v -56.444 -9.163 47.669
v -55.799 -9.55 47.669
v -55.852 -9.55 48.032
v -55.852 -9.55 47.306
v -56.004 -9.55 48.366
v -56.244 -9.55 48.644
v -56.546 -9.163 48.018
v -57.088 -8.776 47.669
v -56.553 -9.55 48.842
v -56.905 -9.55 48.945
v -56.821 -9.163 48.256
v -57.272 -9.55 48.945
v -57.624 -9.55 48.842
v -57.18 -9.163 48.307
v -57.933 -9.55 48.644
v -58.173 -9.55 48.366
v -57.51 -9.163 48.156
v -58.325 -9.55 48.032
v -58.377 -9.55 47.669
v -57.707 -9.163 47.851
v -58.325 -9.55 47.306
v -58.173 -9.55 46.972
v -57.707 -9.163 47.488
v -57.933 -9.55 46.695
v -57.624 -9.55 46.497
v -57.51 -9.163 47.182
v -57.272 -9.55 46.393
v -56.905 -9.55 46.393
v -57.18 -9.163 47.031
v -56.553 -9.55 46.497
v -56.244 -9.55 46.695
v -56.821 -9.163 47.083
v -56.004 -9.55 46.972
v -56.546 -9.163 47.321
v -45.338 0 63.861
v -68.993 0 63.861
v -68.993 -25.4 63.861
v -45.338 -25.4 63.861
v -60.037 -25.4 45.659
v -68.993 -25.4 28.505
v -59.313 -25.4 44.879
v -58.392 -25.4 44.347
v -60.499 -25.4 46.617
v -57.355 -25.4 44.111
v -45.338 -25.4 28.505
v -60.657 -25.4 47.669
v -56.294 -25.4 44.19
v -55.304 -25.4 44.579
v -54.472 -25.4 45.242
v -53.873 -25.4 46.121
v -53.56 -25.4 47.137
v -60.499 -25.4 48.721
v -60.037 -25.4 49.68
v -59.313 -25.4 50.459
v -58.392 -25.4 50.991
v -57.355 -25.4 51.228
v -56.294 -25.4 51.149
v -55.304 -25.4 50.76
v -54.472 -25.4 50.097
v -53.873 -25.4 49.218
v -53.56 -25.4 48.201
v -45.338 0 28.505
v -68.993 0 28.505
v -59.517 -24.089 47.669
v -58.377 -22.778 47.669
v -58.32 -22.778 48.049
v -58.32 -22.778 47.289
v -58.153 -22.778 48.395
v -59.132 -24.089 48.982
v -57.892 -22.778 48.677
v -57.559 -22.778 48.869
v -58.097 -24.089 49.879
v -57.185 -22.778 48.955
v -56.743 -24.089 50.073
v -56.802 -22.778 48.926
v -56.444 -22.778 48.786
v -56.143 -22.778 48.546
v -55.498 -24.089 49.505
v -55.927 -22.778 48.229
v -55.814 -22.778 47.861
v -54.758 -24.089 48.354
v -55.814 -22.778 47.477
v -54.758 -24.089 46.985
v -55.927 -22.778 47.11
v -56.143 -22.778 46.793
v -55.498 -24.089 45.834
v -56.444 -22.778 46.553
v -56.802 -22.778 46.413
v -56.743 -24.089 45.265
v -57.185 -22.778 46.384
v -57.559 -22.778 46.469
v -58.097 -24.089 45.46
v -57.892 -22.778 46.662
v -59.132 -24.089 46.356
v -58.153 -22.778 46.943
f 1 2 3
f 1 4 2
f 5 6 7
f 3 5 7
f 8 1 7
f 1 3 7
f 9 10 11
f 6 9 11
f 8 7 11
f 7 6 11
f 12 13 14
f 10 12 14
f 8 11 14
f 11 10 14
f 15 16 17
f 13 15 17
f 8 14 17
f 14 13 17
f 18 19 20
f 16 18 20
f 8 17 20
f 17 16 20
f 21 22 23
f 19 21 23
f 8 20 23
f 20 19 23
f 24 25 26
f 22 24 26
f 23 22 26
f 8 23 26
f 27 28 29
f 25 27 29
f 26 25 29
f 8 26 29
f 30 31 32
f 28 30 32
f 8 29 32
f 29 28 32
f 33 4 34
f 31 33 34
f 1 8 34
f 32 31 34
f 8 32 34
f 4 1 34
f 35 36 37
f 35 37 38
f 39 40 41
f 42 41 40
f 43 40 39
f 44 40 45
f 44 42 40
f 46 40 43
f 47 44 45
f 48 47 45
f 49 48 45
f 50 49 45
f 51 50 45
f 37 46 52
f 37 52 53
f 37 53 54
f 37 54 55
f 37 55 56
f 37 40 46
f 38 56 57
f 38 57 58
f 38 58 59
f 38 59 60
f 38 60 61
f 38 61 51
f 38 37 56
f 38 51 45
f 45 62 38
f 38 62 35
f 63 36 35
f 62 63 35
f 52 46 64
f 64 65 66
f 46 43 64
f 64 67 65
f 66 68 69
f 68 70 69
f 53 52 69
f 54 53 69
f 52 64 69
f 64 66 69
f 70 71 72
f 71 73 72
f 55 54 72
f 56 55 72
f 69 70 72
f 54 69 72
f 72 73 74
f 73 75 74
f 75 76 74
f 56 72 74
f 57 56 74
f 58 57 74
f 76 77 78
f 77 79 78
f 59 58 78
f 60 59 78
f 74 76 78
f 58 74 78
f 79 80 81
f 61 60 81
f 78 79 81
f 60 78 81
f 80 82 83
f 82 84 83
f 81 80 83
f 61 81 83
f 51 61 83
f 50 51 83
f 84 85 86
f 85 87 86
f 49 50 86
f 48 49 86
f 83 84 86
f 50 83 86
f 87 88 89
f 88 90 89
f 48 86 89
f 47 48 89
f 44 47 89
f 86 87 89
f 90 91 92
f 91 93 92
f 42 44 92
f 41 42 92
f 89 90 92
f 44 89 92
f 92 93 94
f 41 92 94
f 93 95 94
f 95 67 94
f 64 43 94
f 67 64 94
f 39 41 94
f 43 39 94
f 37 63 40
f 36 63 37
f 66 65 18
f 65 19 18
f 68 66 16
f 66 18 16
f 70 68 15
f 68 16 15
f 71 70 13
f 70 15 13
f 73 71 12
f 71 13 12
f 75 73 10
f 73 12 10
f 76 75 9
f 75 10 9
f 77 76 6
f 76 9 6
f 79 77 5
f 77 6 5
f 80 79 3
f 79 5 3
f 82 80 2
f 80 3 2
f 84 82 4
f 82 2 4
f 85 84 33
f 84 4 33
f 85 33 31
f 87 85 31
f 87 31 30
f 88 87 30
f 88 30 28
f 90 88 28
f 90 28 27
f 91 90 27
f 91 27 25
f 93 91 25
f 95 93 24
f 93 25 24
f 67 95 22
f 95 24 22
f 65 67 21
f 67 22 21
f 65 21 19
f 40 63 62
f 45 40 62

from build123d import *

# Parameters (mm, degrees)
F0_W           = 23.6548669636
F0_H           = 35.3559218347
F1_DEPTH       = 25.4
F3_D           = 2.5781
F3_DEPTH       = 15.8496
F3_CSINK_D     = 7.1374
F3_CSINK_ANGLE = 82
F3_TIP         = 0.774539381


with BuildPart() as f1:
    # F0 (on Front) → F1 (new body)
    with BuildSketch(Plane.XZ):
        with Locations((-57.1659114212, 46.1829993874)):
            Rectangle(F0_W, F0_H)
    extrude(amount=F1_DEPTH)

    # F3
    with Locations(Plane.XZ.offset(25.4)):
        with Locations((-57.0883825421, 47.6693250239)):
            CounterSinkHole(F3_D / 2, F3_CSINK_D / 2, depth=F3_DEPTH, counter_sink_angle=F3_CSINK_ANGLE)
            with Locations((0, 0, -(F3_DEPTH + F3_TIP / 2))):  # 118° drill point
                Cone(0, F3_D / 2, F3_TIP, mode=Mode.SUBTRACT)


solid = f1.part
